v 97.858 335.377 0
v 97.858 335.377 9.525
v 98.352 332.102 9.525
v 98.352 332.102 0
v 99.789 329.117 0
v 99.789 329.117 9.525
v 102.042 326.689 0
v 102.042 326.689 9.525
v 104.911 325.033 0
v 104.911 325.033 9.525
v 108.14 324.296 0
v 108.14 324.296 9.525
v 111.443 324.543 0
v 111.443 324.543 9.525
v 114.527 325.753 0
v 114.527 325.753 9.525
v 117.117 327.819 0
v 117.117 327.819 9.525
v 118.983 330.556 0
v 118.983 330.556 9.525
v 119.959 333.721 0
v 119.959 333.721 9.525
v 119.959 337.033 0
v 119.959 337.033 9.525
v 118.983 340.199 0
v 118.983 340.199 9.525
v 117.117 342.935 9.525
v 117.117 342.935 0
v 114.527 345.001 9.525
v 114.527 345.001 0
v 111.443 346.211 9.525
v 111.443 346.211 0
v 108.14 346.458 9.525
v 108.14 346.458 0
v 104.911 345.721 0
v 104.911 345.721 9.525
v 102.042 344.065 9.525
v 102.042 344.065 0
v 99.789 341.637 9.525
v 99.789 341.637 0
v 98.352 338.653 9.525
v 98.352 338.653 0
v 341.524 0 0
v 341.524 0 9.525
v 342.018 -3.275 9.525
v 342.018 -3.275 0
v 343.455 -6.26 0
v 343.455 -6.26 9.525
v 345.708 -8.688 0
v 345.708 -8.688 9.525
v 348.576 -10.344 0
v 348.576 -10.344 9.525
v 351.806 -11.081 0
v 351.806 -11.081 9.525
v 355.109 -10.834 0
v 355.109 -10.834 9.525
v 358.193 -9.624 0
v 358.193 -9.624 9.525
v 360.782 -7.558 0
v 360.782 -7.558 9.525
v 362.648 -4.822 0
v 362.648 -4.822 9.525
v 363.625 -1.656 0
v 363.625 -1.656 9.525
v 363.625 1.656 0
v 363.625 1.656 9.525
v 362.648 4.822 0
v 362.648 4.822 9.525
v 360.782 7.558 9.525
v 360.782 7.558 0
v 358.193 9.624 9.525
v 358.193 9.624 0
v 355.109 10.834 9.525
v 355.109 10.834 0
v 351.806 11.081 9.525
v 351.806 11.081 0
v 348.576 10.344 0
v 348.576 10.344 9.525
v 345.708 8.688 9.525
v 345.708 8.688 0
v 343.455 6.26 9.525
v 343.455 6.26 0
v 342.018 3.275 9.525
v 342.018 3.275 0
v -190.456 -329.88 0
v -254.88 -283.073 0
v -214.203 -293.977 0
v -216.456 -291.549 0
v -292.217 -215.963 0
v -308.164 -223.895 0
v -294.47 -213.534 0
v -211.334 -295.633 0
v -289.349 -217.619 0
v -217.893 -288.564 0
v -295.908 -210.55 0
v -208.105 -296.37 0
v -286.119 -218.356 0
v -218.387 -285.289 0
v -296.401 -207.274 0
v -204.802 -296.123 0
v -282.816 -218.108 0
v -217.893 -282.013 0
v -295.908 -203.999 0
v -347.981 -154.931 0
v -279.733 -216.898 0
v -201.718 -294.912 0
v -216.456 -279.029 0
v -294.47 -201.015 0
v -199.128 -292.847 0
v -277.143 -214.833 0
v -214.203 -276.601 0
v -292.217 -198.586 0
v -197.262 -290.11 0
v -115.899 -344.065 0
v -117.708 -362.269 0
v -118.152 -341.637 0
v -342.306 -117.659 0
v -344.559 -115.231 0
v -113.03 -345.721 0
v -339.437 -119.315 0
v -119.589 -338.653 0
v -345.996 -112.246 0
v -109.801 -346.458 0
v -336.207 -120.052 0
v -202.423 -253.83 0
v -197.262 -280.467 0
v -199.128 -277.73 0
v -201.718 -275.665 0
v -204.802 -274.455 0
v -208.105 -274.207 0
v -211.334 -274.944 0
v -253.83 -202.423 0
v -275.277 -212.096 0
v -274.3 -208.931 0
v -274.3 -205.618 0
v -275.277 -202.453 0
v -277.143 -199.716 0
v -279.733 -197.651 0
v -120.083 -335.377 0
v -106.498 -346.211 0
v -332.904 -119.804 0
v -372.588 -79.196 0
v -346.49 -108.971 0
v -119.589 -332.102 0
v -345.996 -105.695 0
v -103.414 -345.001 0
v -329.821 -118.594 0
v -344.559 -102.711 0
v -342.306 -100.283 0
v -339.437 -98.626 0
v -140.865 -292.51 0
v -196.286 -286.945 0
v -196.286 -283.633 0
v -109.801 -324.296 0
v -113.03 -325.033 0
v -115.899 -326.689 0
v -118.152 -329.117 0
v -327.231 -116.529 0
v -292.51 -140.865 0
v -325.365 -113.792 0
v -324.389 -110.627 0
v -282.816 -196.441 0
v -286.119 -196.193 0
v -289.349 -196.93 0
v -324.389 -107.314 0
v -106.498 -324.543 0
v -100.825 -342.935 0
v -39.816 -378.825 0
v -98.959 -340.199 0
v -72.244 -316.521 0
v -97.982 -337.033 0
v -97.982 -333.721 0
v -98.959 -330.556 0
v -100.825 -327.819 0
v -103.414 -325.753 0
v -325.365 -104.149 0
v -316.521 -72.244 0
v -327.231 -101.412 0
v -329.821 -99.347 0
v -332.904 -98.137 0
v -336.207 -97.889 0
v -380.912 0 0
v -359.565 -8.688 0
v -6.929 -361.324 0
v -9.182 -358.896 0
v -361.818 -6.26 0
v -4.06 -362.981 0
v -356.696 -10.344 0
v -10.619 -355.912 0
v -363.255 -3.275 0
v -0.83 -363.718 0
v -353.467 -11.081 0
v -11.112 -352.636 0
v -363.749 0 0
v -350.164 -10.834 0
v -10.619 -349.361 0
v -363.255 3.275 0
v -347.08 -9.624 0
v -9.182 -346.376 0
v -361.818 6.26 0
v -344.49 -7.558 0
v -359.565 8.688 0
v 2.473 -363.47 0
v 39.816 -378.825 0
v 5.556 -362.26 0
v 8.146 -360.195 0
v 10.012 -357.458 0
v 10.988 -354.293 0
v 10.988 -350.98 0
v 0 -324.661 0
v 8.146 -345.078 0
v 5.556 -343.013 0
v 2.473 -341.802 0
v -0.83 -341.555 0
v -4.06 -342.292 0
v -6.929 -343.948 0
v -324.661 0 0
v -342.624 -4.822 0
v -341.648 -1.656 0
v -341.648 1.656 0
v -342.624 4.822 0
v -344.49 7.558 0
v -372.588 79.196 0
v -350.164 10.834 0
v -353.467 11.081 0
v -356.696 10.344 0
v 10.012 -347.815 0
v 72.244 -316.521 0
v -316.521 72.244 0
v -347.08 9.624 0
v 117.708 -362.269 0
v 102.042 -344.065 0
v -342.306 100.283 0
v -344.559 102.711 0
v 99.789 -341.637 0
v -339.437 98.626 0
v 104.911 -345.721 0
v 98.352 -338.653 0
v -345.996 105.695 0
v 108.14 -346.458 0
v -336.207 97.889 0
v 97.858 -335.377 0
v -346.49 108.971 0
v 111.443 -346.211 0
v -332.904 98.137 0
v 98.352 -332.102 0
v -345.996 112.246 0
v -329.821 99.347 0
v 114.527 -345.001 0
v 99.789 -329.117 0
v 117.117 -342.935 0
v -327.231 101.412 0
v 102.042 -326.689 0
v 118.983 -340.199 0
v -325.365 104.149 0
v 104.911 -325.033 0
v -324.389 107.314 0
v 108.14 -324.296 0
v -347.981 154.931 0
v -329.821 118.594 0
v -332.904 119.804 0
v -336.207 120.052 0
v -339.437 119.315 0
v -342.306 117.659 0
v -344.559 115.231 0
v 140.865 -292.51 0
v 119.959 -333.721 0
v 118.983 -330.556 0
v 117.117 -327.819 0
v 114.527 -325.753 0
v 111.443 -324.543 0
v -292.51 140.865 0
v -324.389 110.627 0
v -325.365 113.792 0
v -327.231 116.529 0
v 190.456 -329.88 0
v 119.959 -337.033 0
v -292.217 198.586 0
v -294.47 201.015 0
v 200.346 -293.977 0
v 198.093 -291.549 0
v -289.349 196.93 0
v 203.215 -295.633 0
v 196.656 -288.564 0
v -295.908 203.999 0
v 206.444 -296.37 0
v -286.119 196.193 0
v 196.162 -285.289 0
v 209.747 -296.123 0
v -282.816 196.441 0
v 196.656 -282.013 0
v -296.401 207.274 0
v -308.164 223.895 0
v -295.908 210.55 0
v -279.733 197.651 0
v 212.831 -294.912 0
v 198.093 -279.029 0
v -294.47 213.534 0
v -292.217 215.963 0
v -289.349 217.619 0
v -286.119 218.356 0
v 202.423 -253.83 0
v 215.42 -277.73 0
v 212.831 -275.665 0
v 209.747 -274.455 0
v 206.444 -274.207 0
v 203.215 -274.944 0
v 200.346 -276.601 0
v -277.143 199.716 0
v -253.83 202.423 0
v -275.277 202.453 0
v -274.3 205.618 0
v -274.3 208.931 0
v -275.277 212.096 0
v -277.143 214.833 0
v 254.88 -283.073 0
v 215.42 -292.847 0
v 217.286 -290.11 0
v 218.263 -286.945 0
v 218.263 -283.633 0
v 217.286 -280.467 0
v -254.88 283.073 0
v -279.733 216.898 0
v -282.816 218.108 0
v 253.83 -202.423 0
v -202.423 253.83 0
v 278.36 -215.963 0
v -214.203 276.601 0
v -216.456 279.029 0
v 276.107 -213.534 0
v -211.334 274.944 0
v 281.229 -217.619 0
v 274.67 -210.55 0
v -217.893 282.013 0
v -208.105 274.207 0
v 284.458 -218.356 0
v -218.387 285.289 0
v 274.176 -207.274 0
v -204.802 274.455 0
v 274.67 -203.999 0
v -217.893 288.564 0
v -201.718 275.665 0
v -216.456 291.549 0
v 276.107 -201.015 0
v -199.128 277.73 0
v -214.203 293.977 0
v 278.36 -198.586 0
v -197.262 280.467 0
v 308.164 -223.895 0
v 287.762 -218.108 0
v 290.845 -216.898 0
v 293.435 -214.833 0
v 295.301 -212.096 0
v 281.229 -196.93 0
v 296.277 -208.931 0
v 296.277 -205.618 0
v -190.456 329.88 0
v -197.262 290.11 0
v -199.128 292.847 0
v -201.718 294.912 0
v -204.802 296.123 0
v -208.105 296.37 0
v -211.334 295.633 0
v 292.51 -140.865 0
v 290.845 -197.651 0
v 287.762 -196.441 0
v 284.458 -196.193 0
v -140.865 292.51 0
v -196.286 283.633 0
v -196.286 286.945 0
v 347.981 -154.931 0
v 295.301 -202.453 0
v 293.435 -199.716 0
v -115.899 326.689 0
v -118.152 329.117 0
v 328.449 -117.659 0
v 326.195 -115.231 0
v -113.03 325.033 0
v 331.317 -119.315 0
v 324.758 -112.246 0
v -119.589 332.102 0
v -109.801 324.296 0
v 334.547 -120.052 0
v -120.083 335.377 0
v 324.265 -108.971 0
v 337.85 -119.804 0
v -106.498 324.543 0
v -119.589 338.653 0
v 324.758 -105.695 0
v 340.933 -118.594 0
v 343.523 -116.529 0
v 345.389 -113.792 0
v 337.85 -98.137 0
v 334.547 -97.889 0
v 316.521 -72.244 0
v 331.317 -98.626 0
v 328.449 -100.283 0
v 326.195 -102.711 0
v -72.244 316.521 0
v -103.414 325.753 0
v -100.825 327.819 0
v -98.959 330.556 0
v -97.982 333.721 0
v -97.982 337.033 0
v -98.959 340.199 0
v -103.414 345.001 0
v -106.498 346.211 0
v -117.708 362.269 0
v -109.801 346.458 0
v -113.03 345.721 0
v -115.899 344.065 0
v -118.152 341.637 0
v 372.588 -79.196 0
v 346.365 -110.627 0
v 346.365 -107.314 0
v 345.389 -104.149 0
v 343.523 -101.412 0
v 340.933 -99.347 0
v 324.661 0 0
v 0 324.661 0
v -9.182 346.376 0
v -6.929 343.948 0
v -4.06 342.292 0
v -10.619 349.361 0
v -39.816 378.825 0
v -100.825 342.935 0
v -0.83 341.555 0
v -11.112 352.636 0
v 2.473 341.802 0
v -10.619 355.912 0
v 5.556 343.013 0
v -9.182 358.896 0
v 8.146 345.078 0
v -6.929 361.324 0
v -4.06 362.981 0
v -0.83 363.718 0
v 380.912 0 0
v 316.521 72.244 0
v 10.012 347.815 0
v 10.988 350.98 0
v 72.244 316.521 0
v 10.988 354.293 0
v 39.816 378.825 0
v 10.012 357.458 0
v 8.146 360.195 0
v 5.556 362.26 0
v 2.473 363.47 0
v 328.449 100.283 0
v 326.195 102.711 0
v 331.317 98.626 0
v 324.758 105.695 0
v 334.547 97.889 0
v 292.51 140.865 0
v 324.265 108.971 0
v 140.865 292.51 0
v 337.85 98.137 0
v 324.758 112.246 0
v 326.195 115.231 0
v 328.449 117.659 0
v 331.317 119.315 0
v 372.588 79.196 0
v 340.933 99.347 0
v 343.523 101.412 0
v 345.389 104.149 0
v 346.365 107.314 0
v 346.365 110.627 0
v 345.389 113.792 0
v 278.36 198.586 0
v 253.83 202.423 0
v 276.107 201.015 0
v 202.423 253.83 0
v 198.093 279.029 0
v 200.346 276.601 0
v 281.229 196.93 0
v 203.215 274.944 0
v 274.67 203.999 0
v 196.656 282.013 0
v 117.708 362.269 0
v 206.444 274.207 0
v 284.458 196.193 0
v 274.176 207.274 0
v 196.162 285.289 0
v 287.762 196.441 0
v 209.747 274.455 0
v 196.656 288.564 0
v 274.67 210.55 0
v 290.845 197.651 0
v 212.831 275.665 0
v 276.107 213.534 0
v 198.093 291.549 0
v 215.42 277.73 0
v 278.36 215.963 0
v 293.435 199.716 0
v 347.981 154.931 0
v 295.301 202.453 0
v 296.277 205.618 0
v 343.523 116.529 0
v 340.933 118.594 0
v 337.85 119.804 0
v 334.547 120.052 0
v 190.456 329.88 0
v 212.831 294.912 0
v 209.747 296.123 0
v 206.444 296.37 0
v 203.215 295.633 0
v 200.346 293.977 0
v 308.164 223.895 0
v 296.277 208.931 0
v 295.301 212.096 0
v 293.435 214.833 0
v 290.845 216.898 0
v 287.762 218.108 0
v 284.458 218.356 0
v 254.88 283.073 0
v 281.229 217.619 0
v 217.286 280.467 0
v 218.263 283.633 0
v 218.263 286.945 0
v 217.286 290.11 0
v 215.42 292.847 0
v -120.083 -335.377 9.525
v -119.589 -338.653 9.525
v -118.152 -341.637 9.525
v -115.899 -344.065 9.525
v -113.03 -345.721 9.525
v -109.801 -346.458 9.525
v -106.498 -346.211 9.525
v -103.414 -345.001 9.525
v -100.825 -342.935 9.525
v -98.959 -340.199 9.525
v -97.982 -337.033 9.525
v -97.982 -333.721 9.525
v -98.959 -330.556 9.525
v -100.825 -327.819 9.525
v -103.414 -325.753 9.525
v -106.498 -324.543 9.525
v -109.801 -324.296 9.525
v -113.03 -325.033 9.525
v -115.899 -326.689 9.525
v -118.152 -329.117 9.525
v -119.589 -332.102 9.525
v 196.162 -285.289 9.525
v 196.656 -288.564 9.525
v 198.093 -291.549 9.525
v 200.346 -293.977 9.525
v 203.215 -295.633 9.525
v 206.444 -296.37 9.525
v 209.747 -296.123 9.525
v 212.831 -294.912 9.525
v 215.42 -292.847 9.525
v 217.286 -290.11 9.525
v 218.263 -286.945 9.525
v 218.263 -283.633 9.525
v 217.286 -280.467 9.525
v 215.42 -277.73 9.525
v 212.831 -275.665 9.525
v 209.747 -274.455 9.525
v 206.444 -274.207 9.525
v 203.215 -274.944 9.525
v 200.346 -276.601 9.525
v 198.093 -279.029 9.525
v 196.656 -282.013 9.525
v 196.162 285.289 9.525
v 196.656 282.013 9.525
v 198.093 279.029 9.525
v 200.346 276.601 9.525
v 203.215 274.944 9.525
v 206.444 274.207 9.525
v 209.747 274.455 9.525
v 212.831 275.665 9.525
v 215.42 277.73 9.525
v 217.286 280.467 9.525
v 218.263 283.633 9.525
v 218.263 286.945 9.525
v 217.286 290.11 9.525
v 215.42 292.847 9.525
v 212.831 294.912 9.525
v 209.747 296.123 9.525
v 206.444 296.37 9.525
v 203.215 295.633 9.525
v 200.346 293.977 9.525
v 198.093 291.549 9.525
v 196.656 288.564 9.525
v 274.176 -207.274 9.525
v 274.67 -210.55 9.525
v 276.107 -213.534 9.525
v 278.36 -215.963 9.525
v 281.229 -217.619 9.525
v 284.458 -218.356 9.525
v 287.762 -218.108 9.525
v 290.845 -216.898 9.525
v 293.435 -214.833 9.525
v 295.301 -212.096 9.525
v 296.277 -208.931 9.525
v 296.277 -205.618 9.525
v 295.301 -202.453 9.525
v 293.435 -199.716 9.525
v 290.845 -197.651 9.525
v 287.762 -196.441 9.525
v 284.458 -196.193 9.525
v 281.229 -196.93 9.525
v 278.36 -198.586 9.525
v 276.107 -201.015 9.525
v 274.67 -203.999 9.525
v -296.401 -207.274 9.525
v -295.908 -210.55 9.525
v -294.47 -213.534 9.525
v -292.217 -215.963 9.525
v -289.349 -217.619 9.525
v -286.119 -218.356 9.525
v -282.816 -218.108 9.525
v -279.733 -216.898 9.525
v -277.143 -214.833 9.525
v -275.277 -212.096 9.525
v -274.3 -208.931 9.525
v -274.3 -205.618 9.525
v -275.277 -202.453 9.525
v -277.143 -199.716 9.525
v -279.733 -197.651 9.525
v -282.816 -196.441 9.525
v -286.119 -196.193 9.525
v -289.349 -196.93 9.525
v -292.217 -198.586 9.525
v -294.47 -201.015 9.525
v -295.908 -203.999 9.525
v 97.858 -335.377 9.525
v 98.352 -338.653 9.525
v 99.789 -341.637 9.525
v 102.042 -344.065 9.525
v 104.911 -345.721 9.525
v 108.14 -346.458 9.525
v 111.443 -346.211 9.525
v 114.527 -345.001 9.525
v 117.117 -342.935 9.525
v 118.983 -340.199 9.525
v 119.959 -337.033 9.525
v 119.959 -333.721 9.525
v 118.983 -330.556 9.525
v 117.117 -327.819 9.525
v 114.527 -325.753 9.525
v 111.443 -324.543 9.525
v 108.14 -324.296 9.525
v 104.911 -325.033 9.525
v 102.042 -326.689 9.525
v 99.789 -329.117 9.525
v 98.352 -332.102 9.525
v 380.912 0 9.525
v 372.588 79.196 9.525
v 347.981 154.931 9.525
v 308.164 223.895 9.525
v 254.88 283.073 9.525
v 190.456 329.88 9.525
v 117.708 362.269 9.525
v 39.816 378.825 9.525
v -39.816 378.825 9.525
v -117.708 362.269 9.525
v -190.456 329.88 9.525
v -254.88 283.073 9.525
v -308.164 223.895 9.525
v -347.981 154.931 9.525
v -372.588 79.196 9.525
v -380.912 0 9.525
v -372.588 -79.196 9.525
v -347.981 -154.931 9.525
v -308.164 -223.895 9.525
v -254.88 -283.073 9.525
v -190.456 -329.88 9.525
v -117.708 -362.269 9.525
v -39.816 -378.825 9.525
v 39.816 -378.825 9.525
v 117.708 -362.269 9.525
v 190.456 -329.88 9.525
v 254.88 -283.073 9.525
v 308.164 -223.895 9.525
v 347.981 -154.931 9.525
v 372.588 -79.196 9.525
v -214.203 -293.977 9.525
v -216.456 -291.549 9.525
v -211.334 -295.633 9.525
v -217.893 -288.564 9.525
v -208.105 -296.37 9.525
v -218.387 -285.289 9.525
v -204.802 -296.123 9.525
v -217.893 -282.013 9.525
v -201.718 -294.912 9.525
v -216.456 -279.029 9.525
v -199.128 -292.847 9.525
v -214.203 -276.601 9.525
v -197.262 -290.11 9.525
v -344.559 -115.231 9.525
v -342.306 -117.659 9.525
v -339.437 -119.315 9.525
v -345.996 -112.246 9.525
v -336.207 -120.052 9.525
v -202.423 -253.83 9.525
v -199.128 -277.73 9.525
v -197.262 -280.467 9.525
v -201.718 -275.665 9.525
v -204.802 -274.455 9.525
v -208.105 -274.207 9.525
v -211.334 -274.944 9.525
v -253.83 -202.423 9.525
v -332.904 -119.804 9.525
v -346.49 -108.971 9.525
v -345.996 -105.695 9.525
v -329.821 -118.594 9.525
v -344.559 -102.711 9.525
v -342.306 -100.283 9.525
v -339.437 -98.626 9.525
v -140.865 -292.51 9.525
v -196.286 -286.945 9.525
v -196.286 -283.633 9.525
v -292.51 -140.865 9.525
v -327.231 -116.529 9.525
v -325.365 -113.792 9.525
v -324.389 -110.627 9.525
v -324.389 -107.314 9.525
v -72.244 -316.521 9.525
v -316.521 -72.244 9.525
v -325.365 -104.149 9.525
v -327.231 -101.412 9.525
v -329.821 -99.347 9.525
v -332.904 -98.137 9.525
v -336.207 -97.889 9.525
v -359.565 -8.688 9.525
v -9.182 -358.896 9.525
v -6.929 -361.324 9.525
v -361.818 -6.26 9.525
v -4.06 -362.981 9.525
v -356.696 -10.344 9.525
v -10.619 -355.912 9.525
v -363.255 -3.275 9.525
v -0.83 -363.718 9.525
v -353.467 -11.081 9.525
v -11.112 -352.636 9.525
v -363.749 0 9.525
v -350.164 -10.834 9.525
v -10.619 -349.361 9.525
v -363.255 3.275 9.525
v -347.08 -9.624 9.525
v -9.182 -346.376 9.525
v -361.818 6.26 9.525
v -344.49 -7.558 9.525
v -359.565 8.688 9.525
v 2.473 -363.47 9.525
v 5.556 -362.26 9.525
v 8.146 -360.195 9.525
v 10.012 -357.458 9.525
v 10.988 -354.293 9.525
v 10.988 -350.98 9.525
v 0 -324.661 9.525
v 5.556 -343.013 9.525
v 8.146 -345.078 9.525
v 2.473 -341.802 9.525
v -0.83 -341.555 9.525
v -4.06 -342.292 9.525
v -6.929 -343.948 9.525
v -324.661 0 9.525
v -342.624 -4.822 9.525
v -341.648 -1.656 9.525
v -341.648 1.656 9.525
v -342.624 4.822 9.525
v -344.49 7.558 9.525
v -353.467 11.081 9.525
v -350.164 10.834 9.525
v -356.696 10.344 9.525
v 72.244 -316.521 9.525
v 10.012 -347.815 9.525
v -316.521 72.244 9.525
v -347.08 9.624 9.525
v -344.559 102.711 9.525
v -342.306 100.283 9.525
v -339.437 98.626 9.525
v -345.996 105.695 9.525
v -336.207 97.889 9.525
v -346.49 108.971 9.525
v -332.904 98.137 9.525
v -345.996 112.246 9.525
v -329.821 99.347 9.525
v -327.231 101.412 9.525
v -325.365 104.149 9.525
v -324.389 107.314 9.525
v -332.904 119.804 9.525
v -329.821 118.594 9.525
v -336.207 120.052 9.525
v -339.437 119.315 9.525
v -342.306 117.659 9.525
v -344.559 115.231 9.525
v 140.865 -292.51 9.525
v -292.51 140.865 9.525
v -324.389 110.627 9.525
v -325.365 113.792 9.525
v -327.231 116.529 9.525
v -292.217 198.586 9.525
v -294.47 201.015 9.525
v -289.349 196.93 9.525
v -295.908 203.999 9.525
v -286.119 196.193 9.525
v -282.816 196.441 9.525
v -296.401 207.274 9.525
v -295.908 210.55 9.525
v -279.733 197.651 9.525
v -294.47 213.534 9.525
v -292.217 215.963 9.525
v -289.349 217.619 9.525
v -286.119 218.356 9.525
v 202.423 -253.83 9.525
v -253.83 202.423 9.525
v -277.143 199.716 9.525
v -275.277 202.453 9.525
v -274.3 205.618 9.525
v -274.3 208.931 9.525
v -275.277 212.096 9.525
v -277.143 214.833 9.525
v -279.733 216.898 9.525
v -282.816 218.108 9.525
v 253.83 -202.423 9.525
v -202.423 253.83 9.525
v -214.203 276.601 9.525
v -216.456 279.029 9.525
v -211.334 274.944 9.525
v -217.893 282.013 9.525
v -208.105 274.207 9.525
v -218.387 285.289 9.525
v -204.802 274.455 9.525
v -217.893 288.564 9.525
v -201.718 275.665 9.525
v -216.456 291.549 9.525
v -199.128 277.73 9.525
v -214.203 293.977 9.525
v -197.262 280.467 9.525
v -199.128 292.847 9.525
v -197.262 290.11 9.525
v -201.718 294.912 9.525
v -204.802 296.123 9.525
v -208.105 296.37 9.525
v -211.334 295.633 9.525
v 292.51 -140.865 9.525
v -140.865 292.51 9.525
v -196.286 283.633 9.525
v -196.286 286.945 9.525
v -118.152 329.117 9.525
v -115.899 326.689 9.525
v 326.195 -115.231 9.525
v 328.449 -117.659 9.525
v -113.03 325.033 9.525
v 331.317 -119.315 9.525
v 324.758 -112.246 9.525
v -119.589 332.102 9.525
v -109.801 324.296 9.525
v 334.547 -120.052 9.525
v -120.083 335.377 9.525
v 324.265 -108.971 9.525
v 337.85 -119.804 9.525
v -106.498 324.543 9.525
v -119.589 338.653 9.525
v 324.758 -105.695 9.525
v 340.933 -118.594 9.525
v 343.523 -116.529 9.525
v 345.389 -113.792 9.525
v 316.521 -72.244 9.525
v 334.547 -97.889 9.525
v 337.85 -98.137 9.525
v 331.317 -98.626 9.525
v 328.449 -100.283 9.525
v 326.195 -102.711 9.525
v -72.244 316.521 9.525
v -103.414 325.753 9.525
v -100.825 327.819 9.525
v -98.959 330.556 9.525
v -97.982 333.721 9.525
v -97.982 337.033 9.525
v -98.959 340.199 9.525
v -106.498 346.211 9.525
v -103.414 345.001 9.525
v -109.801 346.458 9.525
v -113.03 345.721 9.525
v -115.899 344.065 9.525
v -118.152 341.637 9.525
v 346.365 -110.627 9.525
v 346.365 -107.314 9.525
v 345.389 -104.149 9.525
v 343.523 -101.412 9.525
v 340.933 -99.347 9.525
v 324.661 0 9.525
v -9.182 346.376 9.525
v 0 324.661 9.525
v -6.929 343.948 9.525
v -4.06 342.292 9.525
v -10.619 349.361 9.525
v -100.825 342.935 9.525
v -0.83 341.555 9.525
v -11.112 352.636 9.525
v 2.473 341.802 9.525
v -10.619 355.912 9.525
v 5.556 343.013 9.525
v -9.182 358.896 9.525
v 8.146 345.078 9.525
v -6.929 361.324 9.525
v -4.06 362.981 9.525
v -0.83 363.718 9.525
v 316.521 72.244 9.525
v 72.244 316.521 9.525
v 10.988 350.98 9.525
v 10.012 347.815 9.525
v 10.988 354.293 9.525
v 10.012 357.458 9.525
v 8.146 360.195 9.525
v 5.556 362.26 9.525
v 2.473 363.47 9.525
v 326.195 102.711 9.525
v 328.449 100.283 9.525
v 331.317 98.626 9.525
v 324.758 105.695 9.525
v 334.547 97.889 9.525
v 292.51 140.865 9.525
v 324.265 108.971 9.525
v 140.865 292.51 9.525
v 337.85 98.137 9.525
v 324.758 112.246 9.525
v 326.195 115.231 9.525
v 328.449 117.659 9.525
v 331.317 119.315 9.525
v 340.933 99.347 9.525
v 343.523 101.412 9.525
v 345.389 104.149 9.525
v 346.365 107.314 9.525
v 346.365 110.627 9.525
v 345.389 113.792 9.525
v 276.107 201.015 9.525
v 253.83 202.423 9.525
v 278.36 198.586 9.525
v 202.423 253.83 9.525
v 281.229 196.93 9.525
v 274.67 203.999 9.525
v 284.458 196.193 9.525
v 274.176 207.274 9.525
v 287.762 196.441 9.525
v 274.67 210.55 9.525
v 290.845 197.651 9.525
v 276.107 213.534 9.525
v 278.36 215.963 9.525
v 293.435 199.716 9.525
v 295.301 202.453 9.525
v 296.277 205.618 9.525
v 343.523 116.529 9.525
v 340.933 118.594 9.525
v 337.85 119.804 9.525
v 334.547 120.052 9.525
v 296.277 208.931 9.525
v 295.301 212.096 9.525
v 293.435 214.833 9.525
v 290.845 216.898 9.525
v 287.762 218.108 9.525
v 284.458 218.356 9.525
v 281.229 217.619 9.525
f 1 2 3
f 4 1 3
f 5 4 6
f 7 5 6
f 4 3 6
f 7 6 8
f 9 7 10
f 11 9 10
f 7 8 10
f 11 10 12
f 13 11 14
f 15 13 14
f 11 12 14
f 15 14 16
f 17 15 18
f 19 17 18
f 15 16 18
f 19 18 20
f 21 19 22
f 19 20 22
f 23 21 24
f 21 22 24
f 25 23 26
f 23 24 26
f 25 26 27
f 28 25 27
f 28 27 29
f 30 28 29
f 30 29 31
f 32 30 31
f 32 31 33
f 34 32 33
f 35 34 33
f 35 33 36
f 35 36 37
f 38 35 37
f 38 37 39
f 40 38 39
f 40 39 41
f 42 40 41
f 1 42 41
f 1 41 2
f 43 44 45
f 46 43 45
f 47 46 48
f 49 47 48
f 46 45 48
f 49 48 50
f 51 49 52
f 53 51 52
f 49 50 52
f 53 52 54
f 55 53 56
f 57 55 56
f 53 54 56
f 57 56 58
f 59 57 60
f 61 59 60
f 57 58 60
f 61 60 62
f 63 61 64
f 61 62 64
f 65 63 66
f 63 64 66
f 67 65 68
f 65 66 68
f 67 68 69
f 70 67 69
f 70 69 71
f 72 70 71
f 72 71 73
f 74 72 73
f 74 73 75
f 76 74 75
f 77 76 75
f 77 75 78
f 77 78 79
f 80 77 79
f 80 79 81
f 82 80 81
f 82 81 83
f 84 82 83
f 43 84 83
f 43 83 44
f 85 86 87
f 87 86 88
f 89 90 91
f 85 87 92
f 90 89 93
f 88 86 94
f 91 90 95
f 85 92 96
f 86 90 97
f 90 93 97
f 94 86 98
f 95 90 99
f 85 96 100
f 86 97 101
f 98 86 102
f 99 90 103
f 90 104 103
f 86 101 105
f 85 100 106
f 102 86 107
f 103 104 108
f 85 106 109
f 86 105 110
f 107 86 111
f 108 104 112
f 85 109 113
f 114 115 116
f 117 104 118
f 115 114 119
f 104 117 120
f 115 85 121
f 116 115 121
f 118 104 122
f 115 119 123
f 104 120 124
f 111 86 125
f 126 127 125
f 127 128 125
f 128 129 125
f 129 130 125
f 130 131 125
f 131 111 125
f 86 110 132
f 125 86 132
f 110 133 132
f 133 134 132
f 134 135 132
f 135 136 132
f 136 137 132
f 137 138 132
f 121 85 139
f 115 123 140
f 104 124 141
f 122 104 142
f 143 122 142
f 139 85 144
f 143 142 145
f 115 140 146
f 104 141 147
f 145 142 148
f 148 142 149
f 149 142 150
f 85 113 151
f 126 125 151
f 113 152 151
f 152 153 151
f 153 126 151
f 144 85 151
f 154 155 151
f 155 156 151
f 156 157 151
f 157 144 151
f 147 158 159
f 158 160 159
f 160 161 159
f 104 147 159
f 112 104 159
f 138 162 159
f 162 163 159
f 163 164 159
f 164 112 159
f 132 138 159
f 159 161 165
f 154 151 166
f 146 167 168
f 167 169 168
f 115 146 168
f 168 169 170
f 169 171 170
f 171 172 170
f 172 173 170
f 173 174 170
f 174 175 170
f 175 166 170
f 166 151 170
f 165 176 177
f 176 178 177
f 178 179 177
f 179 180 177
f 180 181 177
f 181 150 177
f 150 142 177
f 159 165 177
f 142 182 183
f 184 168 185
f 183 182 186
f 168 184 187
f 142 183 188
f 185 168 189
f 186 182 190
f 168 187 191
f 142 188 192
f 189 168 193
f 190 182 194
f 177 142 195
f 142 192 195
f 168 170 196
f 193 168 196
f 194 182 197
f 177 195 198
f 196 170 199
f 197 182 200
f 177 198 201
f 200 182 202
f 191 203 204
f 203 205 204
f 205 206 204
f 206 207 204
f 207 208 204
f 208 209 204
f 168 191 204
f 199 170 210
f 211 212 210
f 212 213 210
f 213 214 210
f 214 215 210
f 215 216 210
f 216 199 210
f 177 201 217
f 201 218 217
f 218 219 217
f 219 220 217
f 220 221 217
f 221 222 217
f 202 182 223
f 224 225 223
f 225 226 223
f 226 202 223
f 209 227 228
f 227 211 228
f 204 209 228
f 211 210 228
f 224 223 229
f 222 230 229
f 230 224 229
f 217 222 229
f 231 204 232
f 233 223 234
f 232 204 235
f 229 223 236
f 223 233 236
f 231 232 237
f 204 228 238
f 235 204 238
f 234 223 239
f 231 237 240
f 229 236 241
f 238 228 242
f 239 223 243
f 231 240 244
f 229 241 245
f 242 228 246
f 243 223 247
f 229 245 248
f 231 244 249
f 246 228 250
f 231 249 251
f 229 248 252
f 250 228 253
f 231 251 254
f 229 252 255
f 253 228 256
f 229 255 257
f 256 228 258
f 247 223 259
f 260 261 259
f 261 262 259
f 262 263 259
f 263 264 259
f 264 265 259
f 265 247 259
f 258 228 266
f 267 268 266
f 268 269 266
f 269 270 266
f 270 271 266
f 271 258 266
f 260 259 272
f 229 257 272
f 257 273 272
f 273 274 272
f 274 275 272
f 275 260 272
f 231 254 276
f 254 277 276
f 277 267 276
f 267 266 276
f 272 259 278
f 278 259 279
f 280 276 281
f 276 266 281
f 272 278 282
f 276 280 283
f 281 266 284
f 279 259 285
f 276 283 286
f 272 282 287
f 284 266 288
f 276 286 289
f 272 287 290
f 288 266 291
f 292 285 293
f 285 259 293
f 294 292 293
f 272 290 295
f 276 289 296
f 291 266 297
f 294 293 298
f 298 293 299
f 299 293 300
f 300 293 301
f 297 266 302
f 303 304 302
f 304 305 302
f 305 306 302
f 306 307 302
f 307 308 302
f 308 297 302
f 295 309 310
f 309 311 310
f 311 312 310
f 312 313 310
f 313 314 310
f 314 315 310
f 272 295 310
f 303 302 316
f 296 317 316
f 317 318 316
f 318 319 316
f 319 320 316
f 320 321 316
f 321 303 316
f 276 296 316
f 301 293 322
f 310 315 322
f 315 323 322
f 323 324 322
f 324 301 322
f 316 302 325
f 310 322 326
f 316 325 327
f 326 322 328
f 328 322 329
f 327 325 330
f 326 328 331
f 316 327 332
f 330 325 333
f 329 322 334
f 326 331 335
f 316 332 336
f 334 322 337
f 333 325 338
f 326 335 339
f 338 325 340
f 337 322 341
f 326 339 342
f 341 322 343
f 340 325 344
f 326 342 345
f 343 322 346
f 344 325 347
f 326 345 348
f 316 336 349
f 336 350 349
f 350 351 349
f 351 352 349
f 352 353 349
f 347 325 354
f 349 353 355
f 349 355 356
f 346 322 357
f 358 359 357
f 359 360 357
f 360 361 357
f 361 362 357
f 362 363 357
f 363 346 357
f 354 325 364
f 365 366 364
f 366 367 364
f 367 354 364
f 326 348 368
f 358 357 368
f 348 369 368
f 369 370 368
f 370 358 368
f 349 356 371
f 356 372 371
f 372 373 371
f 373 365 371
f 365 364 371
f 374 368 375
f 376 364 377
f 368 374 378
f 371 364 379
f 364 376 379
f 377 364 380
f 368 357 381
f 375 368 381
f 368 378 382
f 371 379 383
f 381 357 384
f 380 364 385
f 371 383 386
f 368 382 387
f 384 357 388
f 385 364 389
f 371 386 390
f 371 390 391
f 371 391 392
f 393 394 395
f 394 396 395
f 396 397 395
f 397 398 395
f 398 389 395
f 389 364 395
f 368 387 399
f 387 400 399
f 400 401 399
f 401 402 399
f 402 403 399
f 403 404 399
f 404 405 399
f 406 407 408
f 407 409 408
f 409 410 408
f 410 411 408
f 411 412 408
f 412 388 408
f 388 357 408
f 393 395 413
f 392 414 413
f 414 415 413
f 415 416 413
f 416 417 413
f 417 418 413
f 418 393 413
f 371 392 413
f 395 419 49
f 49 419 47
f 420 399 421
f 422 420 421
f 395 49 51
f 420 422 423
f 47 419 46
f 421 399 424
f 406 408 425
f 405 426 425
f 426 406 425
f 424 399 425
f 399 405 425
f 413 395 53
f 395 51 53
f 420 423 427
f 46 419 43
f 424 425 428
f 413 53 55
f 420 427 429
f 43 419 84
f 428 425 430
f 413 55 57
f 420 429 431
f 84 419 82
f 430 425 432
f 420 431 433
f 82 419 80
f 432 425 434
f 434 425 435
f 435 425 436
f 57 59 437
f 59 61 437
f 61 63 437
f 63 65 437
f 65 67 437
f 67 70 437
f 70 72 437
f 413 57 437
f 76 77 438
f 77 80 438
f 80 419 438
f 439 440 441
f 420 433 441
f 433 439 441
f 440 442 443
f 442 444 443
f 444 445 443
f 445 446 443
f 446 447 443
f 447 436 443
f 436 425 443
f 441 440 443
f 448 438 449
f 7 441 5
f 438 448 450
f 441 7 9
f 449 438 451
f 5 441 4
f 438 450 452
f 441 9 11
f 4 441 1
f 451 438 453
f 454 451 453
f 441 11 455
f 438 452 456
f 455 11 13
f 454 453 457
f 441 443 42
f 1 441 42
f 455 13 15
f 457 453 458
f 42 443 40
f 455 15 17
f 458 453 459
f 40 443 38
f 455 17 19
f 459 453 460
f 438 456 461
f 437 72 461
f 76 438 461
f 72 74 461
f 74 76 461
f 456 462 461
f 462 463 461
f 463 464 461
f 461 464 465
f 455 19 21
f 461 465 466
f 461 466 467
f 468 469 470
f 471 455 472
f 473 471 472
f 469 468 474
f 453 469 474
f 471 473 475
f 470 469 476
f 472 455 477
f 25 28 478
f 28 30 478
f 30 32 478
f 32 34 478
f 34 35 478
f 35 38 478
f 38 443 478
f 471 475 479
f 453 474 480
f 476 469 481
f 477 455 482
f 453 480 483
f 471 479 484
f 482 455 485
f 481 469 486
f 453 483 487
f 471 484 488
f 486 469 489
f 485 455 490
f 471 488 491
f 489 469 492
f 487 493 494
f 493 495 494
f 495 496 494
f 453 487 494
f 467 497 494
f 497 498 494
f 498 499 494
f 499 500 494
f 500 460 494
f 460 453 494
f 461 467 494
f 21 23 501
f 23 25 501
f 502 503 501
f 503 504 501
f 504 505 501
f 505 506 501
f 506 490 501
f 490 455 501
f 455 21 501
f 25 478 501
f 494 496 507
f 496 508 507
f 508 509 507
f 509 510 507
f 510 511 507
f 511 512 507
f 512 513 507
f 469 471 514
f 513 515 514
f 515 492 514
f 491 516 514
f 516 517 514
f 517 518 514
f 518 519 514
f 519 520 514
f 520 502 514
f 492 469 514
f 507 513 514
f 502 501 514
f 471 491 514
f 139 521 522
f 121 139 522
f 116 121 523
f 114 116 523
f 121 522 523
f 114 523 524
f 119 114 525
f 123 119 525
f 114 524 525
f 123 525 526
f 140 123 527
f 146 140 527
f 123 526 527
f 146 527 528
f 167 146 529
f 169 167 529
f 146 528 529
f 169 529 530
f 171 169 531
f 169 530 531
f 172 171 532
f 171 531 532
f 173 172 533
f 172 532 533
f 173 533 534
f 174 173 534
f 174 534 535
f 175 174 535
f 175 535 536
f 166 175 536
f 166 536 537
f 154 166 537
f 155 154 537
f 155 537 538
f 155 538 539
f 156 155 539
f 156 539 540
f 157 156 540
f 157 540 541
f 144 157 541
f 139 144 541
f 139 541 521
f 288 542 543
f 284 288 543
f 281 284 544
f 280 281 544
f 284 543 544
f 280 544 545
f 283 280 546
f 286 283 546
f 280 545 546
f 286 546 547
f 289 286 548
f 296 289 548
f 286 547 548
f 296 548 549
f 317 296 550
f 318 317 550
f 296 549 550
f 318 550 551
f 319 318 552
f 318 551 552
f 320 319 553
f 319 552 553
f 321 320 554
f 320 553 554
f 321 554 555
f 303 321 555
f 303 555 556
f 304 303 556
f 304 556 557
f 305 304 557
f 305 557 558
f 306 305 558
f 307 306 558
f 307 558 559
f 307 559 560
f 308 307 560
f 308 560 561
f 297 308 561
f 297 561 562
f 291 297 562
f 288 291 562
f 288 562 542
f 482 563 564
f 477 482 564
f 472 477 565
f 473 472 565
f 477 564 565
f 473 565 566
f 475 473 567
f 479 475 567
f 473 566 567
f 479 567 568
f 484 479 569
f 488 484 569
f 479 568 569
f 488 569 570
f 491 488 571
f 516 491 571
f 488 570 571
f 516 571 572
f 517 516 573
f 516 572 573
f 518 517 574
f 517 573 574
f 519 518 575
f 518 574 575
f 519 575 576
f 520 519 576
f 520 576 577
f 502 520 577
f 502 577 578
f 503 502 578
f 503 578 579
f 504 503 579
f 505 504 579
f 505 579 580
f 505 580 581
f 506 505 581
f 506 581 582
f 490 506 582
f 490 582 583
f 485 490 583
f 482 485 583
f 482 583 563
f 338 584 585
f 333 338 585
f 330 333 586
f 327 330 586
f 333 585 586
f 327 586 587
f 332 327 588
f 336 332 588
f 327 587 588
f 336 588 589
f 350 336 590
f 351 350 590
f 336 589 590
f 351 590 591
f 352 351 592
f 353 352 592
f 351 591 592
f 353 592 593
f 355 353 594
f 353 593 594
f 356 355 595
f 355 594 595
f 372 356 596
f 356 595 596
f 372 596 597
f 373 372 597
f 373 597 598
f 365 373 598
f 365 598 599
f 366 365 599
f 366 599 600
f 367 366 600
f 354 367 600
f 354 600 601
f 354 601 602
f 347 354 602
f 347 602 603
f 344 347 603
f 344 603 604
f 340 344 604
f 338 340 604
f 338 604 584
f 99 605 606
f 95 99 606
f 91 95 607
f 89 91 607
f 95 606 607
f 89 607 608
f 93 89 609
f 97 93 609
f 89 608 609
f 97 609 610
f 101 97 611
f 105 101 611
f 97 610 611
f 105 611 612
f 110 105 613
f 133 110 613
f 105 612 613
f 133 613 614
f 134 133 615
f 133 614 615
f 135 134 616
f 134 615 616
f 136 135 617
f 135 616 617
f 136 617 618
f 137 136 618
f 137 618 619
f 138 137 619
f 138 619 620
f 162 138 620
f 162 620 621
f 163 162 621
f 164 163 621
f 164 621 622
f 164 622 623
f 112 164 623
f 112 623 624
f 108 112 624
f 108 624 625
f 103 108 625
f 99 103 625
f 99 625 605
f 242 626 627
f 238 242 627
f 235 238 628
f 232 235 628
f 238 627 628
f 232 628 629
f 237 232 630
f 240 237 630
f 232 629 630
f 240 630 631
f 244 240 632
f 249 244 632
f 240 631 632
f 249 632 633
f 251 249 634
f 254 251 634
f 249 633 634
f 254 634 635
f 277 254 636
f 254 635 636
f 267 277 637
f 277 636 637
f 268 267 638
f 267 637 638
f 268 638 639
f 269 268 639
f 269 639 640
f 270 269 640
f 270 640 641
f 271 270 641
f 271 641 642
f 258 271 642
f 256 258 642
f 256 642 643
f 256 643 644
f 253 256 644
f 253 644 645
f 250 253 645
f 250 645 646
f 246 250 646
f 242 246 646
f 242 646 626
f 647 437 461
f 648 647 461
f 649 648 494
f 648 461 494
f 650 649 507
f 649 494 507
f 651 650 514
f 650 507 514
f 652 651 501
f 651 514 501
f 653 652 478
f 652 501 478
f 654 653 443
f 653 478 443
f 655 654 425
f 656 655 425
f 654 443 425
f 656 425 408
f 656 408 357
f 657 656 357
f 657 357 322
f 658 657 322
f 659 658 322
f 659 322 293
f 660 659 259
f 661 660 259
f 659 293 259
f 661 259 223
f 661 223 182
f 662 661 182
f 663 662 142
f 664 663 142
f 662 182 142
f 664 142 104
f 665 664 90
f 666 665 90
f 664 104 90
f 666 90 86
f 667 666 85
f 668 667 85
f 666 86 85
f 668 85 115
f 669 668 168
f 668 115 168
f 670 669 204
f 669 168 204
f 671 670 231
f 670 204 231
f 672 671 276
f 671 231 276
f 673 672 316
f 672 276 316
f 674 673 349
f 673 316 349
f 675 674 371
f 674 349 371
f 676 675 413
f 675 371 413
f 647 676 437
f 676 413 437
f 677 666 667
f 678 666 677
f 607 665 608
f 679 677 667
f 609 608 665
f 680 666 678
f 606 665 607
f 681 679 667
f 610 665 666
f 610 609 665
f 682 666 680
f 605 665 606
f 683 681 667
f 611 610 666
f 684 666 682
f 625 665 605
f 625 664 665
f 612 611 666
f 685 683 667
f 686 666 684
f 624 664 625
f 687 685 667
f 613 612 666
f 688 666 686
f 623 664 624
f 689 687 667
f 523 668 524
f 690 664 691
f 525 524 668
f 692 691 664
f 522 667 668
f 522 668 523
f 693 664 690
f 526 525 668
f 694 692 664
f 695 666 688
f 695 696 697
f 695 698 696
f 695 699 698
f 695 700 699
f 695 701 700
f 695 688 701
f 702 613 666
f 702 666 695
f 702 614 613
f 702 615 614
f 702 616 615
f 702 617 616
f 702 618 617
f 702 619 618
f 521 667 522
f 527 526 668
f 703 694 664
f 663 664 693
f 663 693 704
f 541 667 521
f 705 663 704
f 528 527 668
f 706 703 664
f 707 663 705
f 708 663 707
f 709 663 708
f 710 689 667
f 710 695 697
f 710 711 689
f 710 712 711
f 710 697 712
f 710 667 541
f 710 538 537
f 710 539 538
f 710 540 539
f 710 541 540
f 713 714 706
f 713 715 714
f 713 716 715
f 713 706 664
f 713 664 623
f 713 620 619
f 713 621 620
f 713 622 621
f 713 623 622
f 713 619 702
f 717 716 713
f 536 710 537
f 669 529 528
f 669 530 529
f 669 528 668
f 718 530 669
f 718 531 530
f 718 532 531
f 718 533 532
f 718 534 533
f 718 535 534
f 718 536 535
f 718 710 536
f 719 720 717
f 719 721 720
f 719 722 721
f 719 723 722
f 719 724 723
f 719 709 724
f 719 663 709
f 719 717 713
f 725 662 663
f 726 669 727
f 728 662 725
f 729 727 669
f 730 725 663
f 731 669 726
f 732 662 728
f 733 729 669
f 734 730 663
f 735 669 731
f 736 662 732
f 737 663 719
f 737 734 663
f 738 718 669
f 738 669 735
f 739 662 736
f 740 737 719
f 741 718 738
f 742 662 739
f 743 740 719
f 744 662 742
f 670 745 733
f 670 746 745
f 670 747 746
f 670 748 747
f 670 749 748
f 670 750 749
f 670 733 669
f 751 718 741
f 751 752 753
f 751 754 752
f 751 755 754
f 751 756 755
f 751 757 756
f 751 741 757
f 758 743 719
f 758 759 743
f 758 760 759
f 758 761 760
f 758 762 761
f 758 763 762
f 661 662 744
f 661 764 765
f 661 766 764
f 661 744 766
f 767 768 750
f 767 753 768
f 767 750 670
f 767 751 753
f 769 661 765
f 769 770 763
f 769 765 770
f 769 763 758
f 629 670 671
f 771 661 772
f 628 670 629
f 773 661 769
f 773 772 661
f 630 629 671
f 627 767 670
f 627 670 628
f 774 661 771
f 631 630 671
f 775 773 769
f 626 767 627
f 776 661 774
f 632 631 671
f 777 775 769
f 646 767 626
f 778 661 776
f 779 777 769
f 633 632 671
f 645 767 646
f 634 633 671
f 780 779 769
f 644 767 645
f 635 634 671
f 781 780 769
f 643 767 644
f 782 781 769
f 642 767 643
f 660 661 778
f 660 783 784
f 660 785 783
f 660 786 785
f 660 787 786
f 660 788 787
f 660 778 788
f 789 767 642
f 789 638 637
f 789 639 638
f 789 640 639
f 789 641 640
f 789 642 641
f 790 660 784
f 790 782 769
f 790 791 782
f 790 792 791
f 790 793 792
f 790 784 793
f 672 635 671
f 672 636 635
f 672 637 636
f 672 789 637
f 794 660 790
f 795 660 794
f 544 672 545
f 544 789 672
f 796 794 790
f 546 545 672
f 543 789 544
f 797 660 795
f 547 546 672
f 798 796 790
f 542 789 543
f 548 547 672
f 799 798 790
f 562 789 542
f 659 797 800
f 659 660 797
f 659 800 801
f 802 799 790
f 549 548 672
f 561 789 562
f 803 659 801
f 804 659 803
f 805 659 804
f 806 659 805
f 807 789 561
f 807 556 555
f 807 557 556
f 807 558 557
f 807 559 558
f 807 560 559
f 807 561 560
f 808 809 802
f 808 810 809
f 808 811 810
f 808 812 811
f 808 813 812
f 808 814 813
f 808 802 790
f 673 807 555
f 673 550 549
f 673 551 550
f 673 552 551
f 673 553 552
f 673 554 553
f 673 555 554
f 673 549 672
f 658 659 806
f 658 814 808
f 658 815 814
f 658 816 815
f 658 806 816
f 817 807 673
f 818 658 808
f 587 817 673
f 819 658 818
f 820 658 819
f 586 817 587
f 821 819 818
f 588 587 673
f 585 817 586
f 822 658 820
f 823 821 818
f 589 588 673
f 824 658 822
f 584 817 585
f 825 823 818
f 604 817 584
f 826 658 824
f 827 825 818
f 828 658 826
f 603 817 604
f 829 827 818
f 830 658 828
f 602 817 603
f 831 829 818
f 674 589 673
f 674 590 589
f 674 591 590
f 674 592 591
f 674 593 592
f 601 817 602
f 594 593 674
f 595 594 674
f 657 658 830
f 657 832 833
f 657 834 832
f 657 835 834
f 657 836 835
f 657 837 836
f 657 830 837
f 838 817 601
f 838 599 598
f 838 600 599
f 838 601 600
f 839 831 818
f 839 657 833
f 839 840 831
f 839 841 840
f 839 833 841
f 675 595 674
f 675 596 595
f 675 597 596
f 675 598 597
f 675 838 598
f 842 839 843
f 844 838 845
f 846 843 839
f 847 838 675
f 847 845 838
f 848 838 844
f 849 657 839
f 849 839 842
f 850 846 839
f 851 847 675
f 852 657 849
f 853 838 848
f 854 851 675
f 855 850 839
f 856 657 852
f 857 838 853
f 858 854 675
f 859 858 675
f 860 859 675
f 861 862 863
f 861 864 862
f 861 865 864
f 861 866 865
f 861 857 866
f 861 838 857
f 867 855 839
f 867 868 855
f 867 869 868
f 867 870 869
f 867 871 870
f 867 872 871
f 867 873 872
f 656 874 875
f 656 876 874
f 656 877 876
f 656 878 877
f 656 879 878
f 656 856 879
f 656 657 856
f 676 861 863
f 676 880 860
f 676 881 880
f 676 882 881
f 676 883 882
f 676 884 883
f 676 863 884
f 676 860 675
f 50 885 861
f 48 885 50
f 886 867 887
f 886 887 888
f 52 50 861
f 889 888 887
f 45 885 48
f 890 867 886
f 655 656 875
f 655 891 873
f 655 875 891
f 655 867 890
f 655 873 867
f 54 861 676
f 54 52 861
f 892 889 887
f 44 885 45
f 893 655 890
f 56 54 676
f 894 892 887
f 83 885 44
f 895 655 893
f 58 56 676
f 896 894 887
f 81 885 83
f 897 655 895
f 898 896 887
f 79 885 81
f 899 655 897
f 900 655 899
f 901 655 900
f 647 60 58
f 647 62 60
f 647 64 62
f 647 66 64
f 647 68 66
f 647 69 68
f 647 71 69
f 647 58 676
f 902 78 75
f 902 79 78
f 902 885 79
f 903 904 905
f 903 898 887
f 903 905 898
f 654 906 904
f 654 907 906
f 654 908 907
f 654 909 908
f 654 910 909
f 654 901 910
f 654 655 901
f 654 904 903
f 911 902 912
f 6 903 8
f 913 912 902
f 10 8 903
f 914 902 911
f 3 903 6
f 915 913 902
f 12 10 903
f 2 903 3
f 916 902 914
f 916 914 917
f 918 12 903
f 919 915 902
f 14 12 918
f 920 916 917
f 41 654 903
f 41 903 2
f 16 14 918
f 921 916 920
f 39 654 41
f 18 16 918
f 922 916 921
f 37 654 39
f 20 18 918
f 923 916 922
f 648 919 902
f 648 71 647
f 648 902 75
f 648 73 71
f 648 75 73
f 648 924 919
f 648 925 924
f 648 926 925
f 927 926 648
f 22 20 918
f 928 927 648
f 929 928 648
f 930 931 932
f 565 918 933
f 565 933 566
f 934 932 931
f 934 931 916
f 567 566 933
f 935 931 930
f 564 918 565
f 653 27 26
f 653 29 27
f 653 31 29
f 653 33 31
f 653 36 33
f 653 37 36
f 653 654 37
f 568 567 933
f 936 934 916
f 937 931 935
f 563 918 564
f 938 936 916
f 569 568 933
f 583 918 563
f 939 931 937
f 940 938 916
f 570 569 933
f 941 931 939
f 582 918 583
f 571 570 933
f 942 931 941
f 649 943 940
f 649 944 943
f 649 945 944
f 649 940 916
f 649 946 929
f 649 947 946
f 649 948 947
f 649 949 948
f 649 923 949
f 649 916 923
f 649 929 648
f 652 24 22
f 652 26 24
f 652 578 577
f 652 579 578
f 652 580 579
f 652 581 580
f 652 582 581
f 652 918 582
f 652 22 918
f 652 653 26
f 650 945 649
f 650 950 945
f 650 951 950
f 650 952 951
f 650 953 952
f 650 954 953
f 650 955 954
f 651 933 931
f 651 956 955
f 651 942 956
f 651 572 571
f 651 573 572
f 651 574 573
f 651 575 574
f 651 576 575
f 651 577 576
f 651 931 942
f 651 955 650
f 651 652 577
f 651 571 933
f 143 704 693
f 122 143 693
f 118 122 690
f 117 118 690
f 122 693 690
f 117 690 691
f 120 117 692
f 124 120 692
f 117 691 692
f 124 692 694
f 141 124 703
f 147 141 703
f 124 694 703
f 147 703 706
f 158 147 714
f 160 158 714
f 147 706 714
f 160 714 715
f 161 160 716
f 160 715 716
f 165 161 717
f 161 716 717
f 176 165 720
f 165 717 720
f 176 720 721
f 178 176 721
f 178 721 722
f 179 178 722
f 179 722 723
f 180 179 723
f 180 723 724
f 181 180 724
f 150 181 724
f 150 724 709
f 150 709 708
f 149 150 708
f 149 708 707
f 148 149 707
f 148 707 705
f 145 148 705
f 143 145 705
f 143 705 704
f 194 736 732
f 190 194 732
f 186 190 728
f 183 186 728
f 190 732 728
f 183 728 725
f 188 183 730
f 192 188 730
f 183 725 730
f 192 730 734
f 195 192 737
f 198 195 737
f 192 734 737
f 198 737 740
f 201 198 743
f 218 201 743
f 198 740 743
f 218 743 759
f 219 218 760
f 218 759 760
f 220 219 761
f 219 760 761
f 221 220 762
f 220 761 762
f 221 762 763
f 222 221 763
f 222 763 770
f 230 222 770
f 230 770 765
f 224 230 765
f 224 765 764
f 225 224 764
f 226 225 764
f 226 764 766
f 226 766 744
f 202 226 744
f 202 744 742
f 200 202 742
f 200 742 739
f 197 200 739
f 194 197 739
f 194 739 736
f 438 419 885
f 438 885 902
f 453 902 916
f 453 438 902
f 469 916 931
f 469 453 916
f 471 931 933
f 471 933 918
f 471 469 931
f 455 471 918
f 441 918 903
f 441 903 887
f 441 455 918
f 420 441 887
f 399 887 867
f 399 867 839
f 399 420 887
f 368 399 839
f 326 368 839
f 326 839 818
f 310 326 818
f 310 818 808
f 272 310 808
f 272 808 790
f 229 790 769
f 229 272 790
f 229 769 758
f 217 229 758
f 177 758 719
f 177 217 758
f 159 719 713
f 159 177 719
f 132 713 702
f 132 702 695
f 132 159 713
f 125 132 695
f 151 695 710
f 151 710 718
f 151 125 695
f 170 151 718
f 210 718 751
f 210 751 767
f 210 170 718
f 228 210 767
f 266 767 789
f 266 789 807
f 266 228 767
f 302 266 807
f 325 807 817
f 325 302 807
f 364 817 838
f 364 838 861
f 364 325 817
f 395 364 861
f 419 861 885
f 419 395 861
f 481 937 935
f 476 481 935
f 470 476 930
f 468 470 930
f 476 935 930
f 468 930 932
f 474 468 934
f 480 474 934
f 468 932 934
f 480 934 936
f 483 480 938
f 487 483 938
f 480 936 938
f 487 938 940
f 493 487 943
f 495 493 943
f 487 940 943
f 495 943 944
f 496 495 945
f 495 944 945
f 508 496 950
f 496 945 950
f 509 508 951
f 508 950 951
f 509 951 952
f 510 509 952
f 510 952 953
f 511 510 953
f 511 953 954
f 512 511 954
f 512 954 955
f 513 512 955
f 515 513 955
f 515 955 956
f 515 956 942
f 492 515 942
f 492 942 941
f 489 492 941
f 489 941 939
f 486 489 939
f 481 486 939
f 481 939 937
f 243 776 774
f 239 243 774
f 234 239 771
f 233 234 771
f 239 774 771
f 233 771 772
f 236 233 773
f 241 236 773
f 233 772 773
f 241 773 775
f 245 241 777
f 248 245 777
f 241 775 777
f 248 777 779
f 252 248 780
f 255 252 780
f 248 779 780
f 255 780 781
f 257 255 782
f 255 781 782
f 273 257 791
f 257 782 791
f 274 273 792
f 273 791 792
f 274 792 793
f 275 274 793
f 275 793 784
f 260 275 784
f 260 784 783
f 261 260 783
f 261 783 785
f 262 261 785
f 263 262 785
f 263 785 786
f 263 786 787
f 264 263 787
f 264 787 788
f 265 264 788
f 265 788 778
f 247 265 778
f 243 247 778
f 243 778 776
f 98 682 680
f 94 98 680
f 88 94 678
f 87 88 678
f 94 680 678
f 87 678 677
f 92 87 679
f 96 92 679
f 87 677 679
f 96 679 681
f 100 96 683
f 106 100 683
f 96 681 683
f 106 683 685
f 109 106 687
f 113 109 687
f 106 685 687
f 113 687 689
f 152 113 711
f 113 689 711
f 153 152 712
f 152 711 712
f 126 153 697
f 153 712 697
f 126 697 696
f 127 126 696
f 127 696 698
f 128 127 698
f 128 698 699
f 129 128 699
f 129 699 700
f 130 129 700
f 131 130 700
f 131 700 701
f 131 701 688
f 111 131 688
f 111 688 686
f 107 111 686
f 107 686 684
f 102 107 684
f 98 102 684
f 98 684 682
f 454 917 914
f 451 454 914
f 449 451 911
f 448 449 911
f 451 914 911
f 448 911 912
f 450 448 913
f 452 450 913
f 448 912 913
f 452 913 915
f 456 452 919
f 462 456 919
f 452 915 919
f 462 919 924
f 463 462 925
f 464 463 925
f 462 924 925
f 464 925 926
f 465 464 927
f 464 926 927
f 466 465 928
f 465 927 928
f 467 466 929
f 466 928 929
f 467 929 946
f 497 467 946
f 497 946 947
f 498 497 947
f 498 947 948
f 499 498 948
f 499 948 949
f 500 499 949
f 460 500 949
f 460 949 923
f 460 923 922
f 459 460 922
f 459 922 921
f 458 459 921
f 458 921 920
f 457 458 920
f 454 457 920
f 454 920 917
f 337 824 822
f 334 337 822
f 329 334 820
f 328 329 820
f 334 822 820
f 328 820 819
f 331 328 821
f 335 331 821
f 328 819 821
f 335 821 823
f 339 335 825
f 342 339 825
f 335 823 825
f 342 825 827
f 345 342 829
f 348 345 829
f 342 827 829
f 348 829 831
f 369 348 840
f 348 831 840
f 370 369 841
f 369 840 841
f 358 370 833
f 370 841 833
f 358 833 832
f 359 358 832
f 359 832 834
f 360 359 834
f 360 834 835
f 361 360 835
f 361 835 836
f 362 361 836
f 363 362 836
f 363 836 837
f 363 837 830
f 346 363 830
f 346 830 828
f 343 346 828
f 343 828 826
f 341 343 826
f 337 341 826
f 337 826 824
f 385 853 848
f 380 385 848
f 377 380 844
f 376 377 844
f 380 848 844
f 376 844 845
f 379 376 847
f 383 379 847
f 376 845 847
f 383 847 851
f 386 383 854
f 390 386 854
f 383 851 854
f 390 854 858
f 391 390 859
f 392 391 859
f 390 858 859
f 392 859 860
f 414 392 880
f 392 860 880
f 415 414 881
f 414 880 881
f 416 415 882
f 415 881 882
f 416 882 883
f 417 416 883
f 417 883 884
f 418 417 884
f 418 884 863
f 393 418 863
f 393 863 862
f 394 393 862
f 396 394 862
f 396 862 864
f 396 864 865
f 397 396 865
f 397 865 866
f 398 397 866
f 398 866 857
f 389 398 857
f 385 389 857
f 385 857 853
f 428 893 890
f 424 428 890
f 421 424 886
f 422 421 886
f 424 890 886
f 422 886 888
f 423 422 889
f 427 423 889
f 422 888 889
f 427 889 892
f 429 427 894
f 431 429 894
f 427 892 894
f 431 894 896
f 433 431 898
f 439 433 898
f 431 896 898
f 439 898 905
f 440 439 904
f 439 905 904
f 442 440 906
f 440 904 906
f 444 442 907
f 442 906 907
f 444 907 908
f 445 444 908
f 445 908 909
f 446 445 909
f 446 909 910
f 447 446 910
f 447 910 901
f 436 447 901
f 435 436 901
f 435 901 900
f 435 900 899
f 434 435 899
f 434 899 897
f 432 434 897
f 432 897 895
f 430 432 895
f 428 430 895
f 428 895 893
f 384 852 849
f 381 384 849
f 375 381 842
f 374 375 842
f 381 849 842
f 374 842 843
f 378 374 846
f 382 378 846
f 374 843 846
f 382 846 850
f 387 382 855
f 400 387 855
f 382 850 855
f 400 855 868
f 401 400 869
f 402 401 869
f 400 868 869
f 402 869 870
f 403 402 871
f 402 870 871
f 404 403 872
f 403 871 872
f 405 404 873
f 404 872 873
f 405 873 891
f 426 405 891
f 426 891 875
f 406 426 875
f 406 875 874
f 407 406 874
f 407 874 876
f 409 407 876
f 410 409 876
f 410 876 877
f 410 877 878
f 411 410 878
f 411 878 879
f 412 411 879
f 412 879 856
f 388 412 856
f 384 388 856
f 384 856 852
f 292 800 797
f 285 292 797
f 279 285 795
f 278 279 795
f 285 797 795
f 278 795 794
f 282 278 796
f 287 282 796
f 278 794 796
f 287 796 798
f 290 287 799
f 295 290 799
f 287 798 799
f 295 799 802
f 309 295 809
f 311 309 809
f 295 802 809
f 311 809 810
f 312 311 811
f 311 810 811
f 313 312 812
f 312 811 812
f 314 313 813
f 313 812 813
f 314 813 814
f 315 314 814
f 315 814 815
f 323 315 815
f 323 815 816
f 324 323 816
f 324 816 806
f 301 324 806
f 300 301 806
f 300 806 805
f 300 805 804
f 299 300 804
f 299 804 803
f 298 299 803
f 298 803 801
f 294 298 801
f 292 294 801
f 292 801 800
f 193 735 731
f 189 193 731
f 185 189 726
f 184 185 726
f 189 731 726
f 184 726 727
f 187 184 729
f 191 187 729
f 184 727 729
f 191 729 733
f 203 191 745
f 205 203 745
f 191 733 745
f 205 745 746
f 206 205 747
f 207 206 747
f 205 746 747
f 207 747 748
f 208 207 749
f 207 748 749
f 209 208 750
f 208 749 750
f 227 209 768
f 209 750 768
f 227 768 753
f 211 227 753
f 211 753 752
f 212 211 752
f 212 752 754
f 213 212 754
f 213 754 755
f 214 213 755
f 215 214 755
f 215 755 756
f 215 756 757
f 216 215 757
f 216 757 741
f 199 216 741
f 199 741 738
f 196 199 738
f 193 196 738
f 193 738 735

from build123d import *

# Parameters (mm, degrees)
F0_R     = 380.9121654934
F0_R_2   = 324.6612464713
F2_DEPTH = 9.525
F5_D     = 22.225


# Not quite as in the source:
# - a feature names something its author has since deleted; it is built from what else it names
# - the program builds the solid bodies; features that only make, move or delete a surface that nothing else refers to are left out


with BuildPart() as f2:
    # F0 (on Top) → F2 (new body)
    with BuildSketch(Plane.XY):
        Circle(F0_R)
        Circle(F0_R_2, mode=Mode.SUBTRACT)
    extrude(amount=F2_DEPTH)

    # F5 (through all)
    with Locations(Plane(origin=(0, 0, 0), x_dir=(1, 0, 0), z_dir=(0, 0, -1))):
        with Locations((-285.2887655833, -207.2744209584), (-335.3770581092, -108.9706118443), (-352.636307478, 0), (-335.3770581092, 108.9706118443), (-285.2887655833, 207.2744209584), (-207.2744209584, 285.2887655833), (-108.9706118443, 335.3770581092), (0, 352.636307478), (108.9706118443, 335.3770581092), (207.2744209584, 285.2887655833), (285.2887655833, 207.2744209584), (335.3770581092, 108.9706118443), (352.636307478, 0), (335.3770581092, -108.9706118443), (285.2887655833, -207.2744209584), (207.2744209584, -285.2887655833), (108.9706118443, -335.3770581092), (0, -352.636307478), (-108.9706118443, -335.3770581092), (-207.2744209584, -285.2887655833)):
            Hole(F5_D / 2)


solid = f2.part
